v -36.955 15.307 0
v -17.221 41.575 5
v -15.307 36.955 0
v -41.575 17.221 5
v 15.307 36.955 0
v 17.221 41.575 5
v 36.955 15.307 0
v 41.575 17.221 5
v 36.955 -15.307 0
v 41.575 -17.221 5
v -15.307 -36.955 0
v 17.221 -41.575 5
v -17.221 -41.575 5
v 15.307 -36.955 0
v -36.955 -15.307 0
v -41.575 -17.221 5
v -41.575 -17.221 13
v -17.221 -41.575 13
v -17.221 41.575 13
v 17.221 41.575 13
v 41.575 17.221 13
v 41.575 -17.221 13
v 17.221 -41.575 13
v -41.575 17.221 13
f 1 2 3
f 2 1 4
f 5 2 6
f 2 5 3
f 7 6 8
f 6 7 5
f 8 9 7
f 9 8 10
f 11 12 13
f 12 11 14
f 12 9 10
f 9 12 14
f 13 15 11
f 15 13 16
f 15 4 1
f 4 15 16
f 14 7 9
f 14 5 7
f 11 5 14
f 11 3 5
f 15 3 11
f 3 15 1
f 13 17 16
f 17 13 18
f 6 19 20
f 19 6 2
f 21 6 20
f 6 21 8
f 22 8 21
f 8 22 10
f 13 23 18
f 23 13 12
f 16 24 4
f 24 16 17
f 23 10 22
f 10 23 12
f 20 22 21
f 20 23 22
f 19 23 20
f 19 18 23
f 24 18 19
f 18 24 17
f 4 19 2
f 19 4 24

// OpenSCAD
SIDES = 8;
/*
    Create a polygonal prism with given circumscribed radius and one side parallel to X axis

    h - height of prism
    r - circumscribed radius
    sides - number of sides
 */
module polygon_prism(h, r, sides=SIDES) {
    rotate([0,0,180/sides]) cylinder(h=h, r=r, $fn=sides);
}

/*
    Creates a pyramid with a base as a regular polygon with the specified number of
    sides with the base centered on threorigin

    h - height of pyramid
    r1 - circumscribed radius of base
    r2 - circumscribed radius of _top
    sides - number of sides
    center_offset - offset from center of top polygon
 */
module polygon_pyramid(h, r1, r2, sides=SIDES, center_offset=[0,0], h3) {
    echo("polygon_pyramid:",h=h,r1=r1,r2=r2,sides=sides,center_offfset=center_offset, h3=h3);
    rotate([0,0,180/SIDES]) translate(center_offset*-r2/r1)
        linear_extrude(height=h, scale=r2/r1) translate(center_offset) circle(r1, $fn=SIDES);
}

/*
    The entrance block expands (possibly) the tower shaft.
 */
module create_entrance_block(r1, r2, h1, h2, sides, h3) {
    echo("create_entrance_block:", h1=h1, h2=h2, r1=r1,r2=r2, h3=h3);
    #polygon_pyramid(h=h1, r1=r1, r2=r2, sides=sides, h3=h3);
    translate([0,0,h1]) polygon_prism(h=h2-h1, r=r2, sides);
}

create_entrance_block(h1=5, h2=20, r1=40, r2=45, sides=8, h3=5);
